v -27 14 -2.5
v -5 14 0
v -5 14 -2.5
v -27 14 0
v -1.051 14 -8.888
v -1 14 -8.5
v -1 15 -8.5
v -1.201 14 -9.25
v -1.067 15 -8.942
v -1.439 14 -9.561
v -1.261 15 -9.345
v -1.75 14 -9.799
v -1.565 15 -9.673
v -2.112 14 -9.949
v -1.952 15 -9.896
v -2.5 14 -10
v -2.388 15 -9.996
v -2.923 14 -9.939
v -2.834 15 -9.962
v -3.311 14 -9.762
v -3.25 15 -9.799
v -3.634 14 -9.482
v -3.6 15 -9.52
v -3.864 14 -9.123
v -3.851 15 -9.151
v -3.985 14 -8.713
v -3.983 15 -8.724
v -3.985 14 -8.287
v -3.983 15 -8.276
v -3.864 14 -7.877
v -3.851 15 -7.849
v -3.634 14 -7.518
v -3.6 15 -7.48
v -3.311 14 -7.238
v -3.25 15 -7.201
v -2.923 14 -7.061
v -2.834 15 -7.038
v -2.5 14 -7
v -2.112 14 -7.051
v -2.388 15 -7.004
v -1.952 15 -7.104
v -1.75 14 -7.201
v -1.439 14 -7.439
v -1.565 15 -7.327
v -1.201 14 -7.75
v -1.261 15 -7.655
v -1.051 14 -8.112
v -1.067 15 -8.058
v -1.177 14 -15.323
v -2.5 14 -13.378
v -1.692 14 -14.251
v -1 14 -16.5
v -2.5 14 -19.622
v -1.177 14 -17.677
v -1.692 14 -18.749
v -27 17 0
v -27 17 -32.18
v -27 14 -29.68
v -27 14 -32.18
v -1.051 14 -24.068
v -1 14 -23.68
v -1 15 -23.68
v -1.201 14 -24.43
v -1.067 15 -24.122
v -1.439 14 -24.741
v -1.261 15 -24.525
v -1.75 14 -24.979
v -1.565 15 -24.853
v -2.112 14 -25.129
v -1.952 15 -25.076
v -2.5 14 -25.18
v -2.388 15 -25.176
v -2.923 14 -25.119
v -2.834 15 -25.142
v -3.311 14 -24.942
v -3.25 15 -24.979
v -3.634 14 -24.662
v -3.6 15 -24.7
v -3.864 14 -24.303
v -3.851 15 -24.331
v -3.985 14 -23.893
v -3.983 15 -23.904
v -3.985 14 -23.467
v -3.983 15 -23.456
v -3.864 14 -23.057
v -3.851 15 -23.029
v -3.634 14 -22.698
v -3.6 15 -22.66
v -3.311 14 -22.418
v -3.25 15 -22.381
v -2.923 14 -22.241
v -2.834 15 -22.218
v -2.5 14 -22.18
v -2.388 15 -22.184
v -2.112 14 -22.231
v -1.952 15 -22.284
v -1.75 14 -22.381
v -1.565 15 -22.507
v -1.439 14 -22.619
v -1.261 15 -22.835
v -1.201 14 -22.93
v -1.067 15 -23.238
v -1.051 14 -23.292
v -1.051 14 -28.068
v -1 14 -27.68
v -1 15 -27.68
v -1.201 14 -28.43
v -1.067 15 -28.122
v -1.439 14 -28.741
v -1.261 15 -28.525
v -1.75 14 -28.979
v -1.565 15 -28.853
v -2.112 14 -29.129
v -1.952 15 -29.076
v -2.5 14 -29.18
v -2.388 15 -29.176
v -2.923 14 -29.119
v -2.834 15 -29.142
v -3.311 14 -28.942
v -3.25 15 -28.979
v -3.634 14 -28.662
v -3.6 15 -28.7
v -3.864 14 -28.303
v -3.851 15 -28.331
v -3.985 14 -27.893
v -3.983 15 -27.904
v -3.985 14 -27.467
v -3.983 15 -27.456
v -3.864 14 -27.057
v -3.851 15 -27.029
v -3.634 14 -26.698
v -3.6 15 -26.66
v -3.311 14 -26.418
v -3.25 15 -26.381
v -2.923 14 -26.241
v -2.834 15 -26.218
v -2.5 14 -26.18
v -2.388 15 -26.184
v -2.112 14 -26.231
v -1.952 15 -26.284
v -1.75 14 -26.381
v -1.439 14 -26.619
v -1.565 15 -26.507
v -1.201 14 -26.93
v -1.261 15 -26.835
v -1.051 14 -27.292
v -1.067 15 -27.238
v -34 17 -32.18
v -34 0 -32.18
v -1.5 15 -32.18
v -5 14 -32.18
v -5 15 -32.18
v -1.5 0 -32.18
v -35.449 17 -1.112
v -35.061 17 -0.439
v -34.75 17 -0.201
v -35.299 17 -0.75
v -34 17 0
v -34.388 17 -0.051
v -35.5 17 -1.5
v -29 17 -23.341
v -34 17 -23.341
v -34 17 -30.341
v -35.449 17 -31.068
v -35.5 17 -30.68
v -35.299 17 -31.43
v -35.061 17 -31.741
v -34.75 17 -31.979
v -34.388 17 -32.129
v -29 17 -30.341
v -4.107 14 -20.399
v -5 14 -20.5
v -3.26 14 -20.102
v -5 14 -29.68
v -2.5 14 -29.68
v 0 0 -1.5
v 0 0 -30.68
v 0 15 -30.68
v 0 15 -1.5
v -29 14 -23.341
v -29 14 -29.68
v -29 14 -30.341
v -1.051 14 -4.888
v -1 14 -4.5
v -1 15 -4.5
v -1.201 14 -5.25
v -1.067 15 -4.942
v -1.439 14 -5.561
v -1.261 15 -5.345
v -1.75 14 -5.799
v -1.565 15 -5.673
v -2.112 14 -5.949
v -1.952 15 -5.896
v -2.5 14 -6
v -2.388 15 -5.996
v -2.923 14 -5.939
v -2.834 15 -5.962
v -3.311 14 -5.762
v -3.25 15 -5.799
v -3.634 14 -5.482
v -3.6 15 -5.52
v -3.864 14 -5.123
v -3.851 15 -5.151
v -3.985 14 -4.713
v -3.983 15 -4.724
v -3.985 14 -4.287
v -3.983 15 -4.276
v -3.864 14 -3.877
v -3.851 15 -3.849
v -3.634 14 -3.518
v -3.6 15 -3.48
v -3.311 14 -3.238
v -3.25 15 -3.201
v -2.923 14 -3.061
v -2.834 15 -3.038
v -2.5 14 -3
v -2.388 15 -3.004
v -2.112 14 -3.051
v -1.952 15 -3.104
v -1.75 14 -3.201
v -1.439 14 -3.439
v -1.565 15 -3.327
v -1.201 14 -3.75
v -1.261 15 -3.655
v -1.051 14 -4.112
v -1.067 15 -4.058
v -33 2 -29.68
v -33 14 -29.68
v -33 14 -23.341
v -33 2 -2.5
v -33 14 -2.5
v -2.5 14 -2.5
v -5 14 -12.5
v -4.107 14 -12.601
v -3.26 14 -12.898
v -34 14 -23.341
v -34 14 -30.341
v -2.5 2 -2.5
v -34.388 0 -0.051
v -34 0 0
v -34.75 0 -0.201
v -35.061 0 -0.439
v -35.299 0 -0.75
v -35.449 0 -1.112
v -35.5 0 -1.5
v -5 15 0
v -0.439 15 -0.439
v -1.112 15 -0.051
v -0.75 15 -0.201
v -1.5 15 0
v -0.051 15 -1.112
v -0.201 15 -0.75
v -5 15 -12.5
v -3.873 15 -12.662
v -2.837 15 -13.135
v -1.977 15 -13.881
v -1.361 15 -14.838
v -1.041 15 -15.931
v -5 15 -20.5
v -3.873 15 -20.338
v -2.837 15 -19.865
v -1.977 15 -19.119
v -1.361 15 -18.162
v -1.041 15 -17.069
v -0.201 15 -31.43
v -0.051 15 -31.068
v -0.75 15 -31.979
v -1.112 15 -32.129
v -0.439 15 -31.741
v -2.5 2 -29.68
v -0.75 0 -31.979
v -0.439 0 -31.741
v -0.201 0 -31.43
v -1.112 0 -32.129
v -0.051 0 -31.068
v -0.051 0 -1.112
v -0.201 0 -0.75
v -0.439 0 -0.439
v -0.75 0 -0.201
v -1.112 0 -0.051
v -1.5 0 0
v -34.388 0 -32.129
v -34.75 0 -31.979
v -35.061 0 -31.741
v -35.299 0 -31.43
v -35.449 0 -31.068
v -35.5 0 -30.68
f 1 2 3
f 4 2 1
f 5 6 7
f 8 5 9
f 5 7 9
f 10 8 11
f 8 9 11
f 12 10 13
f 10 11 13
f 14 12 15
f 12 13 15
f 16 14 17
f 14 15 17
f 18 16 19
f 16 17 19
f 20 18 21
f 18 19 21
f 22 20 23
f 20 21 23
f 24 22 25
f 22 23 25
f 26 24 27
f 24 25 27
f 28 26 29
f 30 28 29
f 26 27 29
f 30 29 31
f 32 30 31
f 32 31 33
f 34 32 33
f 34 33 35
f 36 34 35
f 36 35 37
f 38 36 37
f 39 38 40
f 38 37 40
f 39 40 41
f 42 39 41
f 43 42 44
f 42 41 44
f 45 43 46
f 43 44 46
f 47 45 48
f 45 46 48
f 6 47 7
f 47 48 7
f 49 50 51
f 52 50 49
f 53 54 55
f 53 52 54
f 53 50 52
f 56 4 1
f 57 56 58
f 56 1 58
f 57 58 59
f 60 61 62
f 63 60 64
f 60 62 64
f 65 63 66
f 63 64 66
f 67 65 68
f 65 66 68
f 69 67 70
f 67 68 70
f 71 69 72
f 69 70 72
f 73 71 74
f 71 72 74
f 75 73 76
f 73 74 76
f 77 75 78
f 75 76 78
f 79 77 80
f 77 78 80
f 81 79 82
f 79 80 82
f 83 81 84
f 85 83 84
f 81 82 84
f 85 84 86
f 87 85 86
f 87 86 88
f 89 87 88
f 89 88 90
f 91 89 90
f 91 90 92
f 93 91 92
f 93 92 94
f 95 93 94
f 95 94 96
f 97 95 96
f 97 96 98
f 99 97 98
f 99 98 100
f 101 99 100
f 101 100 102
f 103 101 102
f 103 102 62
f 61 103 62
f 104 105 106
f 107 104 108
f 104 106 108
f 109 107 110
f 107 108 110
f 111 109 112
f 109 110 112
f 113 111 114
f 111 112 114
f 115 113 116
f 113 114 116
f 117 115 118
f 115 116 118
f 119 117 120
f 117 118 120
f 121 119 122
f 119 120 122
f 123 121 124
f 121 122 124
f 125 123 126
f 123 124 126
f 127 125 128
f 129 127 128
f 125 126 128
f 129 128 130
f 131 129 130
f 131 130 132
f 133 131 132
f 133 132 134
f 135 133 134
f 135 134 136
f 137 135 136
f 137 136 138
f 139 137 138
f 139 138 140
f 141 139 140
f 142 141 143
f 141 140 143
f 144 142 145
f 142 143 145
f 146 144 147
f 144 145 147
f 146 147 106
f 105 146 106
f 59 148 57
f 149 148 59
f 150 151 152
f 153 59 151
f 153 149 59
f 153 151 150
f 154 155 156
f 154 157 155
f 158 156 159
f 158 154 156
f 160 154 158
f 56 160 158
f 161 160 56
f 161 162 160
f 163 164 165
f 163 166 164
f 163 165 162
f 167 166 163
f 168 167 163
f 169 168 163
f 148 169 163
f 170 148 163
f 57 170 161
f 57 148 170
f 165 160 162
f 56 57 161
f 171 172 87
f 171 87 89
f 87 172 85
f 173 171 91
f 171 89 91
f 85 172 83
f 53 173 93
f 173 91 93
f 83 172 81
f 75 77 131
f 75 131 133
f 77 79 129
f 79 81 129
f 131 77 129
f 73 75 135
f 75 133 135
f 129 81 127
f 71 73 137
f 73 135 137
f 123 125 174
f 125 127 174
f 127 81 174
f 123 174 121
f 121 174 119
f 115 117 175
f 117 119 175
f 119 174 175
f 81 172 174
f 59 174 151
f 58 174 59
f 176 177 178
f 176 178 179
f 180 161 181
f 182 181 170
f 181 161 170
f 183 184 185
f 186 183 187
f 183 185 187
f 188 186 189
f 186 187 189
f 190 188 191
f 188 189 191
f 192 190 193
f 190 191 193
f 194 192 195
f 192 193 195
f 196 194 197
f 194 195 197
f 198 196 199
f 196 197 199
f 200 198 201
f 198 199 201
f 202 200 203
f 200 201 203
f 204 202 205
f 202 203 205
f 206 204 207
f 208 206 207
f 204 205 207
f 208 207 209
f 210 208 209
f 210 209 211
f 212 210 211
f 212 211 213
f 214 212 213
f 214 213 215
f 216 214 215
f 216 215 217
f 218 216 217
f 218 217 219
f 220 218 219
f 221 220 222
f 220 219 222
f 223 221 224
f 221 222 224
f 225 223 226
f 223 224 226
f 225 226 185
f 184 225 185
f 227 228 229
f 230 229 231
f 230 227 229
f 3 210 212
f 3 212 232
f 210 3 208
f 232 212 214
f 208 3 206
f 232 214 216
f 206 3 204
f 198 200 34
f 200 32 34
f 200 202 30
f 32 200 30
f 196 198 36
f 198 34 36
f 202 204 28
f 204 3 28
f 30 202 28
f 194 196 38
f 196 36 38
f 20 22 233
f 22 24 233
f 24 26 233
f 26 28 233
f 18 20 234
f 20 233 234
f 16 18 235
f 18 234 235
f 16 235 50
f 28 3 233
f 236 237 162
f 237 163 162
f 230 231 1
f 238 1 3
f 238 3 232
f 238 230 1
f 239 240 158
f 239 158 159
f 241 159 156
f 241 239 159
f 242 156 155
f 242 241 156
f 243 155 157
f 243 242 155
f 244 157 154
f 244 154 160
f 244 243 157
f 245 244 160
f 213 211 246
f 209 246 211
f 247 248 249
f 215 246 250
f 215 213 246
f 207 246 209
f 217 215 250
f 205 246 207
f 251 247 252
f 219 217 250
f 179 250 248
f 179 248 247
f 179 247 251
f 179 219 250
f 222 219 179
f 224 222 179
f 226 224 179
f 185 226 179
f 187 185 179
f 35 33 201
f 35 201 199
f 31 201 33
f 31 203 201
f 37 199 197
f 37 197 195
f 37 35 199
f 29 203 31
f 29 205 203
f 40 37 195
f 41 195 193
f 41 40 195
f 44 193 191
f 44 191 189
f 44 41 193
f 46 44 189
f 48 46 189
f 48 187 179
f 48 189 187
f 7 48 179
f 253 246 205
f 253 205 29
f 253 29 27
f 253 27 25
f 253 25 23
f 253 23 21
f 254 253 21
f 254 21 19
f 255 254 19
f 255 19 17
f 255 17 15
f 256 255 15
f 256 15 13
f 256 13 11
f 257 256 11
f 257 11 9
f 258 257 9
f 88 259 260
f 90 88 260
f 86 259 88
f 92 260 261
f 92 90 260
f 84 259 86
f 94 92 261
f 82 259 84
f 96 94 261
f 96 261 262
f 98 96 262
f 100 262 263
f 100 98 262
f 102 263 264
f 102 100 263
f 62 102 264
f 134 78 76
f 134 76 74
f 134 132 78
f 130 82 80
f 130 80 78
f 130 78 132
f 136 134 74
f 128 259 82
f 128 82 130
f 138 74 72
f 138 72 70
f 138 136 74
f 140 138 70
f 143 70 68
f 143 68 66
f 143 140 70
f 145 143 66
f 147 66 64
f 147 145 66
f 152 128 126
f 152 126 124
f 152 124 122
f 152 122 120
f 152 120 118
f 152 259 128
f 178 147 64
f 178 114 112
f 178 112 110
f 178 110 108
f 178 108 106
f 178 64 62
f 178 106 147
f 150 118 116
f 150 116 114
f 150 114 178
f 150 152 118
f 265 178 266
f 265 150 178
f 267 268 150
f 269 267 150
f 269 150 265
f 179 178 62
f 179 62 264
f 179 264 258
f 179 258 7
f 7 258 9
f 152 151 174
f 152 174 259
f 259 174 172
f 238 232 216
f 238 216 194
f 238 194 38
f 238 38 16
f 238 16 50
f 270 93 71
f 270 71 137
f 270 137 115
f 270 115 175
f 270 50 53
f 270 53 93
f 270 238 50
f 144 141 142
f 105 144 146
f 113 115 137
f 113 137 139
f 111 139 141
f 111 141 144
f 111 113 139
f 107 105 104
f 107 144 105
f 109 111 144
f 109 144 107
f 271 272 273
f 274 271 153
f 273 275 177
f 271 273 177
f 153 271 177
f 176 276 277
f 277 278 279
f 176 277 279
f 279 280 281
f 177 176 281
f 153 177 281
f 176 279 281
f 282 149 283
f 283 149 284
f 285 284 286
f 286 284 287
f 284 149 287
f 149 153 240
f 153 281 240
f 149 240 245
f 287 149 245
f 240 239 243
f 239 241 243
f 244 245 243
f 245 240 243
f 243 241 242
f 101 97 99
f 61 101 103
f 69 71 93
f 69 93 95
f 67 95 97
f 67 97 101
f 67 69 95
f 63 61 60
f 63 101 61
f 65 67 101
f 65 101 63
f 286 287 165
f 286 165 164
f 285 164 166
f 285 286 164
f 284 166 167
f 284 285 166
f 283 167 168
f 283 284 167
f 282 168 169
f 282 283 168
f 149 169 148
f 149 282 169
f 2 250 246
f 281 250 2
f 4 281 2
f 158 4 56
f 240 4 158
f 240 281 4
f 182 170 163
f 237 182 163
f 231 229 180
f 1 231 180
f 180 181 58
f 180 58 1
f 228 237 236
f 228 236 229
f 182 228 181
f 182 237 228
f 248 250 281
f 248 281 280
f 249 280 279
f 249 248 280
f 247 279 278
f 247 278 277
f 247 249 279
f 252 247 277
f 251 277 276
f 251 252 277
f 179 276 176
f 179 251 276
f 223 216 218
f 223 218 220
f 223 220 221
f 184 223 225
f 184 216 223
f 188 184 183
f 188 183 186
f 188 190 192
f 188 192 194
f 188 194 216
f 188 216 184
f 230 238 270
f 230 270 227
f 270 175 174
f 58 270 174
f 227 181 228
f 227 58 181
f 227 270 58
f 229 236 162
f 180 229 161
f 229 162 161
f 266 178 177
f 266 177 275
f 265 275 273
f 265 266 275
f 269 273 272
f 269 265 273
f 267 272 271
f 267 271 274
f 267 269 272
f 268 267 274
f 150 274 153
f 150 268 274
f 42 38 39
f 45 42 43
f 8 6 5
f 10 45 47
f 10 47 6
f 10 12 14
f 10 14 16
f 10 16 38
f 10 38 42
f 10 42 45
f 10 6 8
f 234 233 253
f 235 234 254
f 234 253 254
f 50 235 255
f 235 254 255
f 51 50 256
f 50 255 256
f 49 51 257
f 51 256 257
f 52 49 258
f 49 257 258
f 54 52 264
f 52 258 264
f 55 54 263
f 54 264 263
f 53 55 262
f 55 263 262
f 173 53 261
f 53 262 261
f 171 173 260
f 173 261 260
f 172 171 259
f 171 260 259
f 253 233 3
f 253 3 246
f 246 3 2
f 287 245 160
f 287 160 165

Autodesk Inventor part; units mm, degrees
ref_plane "YZ Plane" through (0, 0, 0) normal (1, 0, 0) x (0, 1, 0)
ref_plane "XZ Plane" through (0, 0, 0) normal (0, 1, 0) x (-1, 0, 0)
ref_plane "XY Plane" through (0, 0, 0) normal (0, 0, 1) x (1, 0, 0)
sketch "Sketch1" plane through (0, 0, 0) normal (0, 1, 0) x (-1, 0, 0)
  line L0 (0, 0) -> (35.5, 0)
  line L1 (35.5, 0) -> (35.5, -32.18)
  line L2 (35.5, -32.18) -> (0, -32.18)
  line L3 (0, -32.18) -> (0, 0)
  line L4 (33, -2.5) -> (2.5, -2.5)
  line L5 (2.5, -2.5) -> (2.5, -29.68)
  line L6 (2.5, -29.68) -> (33, -29.68)
  line L7 (33, -29.68) -> (33, -2.5)
  dimension "d0" = 32.18
  dimension "d1" = 35.5
  dimension "d2" = 2.5
  dimension "d3" = 2.5
  dimension "d4" = 2.5
  dimension "d5" = 2.5
extrude "Extrusion1" add sketch "Sketch1" along normal blind 2 contours L0 L1 L2 L3 | L7 L6 L5 L4
extrude "Extrusion2" add sketch "Sketch1" along normal blind 14
sketch "Sketch2" plane through (0, 14, 0) normal (0, 1, 0) x (1, 0, 0)
  line L0 (-33, 2.5) -> (-33, 29.68) projected
  line L1 (-33, 29.68) -> (-2.5, 29.68) projected
  line L2 (-2.5, 29.68) -> (-2.5, 2.5) projected
  line L3 (-2.5, 2.5) -> (-33, 2.5) projected
  line L4 (-35.5, 0) -> (0, 0) projected
  line L5 (0, 0) -> (0, 32.18) projected
  line L6 (0, 32.18) -> (-35.5, 32.18) projected
  line L7 (-35.5, 32.18) -> (-35.5, 0) projected
  line L8 (-35.5, 0) -> (-35.5, 32.18) projected
  line L9 (0, 32.18) -> (-35.5, 32.18) projected
  line L10 (-35.5, 0) -> (-27, 0)
  line L11 (-27, 0) -> (-27, 32.18)
  line L12 (-27, 32.18) -> (-35.5, 32.18)
  line L13 (-35.5, 32.18) -> (-35.5, 0)
  dimension "d10" = 8.5
extrude "Extrusion3" add sketch "Sketch2" along normal blind 3 contours L3 L11 L4 L7 L6 L1 L0 | L0 L1 L11 L3
sketch "Sketch3" plane through (0, 17, 0) normal (0, 1, 0) x (1, 0, 0)
  line L0 (-35.5, 0) -> (-27, 0) projected
  line L1 (-27, 0) -> (-27, 32.18) projected
  line L2 (-27, 32.18) -> (-35.5, 32.18) projected
  line L3 (-35.5, 32.18) -> (-35.5, 0) projected
  line L4 (-34, 23.341) -> (-29, 23.341)
  line L5 (-29, 23.341) -> (-29, 30.341)
  line L6 (-29, 30.341) -> (-34, 30.341)
  line L7 (-34, 30.341) -> (-34, 23.341)
  point P0 (0, 0)
  dimension "d13" = 7
  dimension "d14" = 5
  dimension "d15" = 2
extrude "Extrusion4" cut sketch "Sketch3" against normal blind 3 contours L7 L6 L5 L4
sketch "Sketch4" plane through (0, 14, 0) normal (0, 1, 0) x (1, 0, 0)
  line L0 (-27, 32.18) -> (-27, 29.68) projected
  line L1 (-27, 29.68) -> (-2.5, 29.68) projected
  line L2 (-2.5, 29.68) -> (-2.5, 2.5) projected
  line L3 (-2.5, 2.5) -> (-27, 2.5) projected
  line L4 (-27, 2.5) -> (-27, 0) projected
  line L5 (-27, 0) -> (0, 0) projected
  line L6 (0, 0) -> (0, 32.18) projected
  line L7 (0, 32.18) -> (-27, 32.18) projected
  line L8 (0, 32.18) -> (0, 0) projected
  line L9 (0, 0) -> (-35.5, 0) projected
  line L10 (0, 32.18) -> (-5, 32.18)
  line L11 (-5, 32.18) -> (-5, 0)
  line L12 (-5, 0) -> (0, 0)
  line L13 (0, 0) -> (0, 32.18)
  dimension "d18" = 5
extrude "Extrusion5" add sketch "Sketch4" along normal blind 1 contours L7 L6 L5 L11 L3 L2 L1 | L1 L2 L3 L11
sketch "Sketch5" plane through (0, 15, 0) normal (0, 1, 0) x (1, 0, 0)
  line L0 (-5, 32.18) -> (-5, 0) projected
  line L1 (-5, 2.5) -> (-27, 2.5) projected
  line L2 (-5, 29.68) -> (-5, 2.5) projected
  circle A0 centre (-5, 16.5) radius 4
  line L3 (-2.5, 29.68) -> (-2.5, 2.5) projected
  circle A1 centre (-2.5, 27.68) radius 1.5
  circle A2 centre (-2.5, 23.68) radius 1.5
  circle A3 centre (-2.5, 8.5) radius 1.5
  circle A4 centre (-2.5, 4.5) radius 1.5
  line L4 (-5, 0) -> (0, 0) projected
  line L5 (0, 32.18) -> (-5, 32.18) projected
  dimension "d21" = 8
  dimension "d22" = 14
  dimension "d23" = 3
  dimension "d24" = 3
  dimension "d25" = 3
  dimension "d26" = 3
  dimension "d29" = 4.5
  dimension "d30" = 8.5
  dimension "d31" = 4.5
  dimension "d32" = 8.5
extrude "Extrusion6" cut sketch "Sketch5" against normal blind 1
fillet "Fillet1" radius 1.5 4 edges at (0, 7.5, -32.18) (-35.5, 8.5, -32.18) (-35.5, 8.5, 0) (0, 7.5, 0)
equation "\"d3\" = d2"
equation "\"d4\" = d2"
equation "\"d5\" = d2"
equation "\"d31\" = d29"
equation "\"d32\" = d30"
properties material "ABS Plastic"
